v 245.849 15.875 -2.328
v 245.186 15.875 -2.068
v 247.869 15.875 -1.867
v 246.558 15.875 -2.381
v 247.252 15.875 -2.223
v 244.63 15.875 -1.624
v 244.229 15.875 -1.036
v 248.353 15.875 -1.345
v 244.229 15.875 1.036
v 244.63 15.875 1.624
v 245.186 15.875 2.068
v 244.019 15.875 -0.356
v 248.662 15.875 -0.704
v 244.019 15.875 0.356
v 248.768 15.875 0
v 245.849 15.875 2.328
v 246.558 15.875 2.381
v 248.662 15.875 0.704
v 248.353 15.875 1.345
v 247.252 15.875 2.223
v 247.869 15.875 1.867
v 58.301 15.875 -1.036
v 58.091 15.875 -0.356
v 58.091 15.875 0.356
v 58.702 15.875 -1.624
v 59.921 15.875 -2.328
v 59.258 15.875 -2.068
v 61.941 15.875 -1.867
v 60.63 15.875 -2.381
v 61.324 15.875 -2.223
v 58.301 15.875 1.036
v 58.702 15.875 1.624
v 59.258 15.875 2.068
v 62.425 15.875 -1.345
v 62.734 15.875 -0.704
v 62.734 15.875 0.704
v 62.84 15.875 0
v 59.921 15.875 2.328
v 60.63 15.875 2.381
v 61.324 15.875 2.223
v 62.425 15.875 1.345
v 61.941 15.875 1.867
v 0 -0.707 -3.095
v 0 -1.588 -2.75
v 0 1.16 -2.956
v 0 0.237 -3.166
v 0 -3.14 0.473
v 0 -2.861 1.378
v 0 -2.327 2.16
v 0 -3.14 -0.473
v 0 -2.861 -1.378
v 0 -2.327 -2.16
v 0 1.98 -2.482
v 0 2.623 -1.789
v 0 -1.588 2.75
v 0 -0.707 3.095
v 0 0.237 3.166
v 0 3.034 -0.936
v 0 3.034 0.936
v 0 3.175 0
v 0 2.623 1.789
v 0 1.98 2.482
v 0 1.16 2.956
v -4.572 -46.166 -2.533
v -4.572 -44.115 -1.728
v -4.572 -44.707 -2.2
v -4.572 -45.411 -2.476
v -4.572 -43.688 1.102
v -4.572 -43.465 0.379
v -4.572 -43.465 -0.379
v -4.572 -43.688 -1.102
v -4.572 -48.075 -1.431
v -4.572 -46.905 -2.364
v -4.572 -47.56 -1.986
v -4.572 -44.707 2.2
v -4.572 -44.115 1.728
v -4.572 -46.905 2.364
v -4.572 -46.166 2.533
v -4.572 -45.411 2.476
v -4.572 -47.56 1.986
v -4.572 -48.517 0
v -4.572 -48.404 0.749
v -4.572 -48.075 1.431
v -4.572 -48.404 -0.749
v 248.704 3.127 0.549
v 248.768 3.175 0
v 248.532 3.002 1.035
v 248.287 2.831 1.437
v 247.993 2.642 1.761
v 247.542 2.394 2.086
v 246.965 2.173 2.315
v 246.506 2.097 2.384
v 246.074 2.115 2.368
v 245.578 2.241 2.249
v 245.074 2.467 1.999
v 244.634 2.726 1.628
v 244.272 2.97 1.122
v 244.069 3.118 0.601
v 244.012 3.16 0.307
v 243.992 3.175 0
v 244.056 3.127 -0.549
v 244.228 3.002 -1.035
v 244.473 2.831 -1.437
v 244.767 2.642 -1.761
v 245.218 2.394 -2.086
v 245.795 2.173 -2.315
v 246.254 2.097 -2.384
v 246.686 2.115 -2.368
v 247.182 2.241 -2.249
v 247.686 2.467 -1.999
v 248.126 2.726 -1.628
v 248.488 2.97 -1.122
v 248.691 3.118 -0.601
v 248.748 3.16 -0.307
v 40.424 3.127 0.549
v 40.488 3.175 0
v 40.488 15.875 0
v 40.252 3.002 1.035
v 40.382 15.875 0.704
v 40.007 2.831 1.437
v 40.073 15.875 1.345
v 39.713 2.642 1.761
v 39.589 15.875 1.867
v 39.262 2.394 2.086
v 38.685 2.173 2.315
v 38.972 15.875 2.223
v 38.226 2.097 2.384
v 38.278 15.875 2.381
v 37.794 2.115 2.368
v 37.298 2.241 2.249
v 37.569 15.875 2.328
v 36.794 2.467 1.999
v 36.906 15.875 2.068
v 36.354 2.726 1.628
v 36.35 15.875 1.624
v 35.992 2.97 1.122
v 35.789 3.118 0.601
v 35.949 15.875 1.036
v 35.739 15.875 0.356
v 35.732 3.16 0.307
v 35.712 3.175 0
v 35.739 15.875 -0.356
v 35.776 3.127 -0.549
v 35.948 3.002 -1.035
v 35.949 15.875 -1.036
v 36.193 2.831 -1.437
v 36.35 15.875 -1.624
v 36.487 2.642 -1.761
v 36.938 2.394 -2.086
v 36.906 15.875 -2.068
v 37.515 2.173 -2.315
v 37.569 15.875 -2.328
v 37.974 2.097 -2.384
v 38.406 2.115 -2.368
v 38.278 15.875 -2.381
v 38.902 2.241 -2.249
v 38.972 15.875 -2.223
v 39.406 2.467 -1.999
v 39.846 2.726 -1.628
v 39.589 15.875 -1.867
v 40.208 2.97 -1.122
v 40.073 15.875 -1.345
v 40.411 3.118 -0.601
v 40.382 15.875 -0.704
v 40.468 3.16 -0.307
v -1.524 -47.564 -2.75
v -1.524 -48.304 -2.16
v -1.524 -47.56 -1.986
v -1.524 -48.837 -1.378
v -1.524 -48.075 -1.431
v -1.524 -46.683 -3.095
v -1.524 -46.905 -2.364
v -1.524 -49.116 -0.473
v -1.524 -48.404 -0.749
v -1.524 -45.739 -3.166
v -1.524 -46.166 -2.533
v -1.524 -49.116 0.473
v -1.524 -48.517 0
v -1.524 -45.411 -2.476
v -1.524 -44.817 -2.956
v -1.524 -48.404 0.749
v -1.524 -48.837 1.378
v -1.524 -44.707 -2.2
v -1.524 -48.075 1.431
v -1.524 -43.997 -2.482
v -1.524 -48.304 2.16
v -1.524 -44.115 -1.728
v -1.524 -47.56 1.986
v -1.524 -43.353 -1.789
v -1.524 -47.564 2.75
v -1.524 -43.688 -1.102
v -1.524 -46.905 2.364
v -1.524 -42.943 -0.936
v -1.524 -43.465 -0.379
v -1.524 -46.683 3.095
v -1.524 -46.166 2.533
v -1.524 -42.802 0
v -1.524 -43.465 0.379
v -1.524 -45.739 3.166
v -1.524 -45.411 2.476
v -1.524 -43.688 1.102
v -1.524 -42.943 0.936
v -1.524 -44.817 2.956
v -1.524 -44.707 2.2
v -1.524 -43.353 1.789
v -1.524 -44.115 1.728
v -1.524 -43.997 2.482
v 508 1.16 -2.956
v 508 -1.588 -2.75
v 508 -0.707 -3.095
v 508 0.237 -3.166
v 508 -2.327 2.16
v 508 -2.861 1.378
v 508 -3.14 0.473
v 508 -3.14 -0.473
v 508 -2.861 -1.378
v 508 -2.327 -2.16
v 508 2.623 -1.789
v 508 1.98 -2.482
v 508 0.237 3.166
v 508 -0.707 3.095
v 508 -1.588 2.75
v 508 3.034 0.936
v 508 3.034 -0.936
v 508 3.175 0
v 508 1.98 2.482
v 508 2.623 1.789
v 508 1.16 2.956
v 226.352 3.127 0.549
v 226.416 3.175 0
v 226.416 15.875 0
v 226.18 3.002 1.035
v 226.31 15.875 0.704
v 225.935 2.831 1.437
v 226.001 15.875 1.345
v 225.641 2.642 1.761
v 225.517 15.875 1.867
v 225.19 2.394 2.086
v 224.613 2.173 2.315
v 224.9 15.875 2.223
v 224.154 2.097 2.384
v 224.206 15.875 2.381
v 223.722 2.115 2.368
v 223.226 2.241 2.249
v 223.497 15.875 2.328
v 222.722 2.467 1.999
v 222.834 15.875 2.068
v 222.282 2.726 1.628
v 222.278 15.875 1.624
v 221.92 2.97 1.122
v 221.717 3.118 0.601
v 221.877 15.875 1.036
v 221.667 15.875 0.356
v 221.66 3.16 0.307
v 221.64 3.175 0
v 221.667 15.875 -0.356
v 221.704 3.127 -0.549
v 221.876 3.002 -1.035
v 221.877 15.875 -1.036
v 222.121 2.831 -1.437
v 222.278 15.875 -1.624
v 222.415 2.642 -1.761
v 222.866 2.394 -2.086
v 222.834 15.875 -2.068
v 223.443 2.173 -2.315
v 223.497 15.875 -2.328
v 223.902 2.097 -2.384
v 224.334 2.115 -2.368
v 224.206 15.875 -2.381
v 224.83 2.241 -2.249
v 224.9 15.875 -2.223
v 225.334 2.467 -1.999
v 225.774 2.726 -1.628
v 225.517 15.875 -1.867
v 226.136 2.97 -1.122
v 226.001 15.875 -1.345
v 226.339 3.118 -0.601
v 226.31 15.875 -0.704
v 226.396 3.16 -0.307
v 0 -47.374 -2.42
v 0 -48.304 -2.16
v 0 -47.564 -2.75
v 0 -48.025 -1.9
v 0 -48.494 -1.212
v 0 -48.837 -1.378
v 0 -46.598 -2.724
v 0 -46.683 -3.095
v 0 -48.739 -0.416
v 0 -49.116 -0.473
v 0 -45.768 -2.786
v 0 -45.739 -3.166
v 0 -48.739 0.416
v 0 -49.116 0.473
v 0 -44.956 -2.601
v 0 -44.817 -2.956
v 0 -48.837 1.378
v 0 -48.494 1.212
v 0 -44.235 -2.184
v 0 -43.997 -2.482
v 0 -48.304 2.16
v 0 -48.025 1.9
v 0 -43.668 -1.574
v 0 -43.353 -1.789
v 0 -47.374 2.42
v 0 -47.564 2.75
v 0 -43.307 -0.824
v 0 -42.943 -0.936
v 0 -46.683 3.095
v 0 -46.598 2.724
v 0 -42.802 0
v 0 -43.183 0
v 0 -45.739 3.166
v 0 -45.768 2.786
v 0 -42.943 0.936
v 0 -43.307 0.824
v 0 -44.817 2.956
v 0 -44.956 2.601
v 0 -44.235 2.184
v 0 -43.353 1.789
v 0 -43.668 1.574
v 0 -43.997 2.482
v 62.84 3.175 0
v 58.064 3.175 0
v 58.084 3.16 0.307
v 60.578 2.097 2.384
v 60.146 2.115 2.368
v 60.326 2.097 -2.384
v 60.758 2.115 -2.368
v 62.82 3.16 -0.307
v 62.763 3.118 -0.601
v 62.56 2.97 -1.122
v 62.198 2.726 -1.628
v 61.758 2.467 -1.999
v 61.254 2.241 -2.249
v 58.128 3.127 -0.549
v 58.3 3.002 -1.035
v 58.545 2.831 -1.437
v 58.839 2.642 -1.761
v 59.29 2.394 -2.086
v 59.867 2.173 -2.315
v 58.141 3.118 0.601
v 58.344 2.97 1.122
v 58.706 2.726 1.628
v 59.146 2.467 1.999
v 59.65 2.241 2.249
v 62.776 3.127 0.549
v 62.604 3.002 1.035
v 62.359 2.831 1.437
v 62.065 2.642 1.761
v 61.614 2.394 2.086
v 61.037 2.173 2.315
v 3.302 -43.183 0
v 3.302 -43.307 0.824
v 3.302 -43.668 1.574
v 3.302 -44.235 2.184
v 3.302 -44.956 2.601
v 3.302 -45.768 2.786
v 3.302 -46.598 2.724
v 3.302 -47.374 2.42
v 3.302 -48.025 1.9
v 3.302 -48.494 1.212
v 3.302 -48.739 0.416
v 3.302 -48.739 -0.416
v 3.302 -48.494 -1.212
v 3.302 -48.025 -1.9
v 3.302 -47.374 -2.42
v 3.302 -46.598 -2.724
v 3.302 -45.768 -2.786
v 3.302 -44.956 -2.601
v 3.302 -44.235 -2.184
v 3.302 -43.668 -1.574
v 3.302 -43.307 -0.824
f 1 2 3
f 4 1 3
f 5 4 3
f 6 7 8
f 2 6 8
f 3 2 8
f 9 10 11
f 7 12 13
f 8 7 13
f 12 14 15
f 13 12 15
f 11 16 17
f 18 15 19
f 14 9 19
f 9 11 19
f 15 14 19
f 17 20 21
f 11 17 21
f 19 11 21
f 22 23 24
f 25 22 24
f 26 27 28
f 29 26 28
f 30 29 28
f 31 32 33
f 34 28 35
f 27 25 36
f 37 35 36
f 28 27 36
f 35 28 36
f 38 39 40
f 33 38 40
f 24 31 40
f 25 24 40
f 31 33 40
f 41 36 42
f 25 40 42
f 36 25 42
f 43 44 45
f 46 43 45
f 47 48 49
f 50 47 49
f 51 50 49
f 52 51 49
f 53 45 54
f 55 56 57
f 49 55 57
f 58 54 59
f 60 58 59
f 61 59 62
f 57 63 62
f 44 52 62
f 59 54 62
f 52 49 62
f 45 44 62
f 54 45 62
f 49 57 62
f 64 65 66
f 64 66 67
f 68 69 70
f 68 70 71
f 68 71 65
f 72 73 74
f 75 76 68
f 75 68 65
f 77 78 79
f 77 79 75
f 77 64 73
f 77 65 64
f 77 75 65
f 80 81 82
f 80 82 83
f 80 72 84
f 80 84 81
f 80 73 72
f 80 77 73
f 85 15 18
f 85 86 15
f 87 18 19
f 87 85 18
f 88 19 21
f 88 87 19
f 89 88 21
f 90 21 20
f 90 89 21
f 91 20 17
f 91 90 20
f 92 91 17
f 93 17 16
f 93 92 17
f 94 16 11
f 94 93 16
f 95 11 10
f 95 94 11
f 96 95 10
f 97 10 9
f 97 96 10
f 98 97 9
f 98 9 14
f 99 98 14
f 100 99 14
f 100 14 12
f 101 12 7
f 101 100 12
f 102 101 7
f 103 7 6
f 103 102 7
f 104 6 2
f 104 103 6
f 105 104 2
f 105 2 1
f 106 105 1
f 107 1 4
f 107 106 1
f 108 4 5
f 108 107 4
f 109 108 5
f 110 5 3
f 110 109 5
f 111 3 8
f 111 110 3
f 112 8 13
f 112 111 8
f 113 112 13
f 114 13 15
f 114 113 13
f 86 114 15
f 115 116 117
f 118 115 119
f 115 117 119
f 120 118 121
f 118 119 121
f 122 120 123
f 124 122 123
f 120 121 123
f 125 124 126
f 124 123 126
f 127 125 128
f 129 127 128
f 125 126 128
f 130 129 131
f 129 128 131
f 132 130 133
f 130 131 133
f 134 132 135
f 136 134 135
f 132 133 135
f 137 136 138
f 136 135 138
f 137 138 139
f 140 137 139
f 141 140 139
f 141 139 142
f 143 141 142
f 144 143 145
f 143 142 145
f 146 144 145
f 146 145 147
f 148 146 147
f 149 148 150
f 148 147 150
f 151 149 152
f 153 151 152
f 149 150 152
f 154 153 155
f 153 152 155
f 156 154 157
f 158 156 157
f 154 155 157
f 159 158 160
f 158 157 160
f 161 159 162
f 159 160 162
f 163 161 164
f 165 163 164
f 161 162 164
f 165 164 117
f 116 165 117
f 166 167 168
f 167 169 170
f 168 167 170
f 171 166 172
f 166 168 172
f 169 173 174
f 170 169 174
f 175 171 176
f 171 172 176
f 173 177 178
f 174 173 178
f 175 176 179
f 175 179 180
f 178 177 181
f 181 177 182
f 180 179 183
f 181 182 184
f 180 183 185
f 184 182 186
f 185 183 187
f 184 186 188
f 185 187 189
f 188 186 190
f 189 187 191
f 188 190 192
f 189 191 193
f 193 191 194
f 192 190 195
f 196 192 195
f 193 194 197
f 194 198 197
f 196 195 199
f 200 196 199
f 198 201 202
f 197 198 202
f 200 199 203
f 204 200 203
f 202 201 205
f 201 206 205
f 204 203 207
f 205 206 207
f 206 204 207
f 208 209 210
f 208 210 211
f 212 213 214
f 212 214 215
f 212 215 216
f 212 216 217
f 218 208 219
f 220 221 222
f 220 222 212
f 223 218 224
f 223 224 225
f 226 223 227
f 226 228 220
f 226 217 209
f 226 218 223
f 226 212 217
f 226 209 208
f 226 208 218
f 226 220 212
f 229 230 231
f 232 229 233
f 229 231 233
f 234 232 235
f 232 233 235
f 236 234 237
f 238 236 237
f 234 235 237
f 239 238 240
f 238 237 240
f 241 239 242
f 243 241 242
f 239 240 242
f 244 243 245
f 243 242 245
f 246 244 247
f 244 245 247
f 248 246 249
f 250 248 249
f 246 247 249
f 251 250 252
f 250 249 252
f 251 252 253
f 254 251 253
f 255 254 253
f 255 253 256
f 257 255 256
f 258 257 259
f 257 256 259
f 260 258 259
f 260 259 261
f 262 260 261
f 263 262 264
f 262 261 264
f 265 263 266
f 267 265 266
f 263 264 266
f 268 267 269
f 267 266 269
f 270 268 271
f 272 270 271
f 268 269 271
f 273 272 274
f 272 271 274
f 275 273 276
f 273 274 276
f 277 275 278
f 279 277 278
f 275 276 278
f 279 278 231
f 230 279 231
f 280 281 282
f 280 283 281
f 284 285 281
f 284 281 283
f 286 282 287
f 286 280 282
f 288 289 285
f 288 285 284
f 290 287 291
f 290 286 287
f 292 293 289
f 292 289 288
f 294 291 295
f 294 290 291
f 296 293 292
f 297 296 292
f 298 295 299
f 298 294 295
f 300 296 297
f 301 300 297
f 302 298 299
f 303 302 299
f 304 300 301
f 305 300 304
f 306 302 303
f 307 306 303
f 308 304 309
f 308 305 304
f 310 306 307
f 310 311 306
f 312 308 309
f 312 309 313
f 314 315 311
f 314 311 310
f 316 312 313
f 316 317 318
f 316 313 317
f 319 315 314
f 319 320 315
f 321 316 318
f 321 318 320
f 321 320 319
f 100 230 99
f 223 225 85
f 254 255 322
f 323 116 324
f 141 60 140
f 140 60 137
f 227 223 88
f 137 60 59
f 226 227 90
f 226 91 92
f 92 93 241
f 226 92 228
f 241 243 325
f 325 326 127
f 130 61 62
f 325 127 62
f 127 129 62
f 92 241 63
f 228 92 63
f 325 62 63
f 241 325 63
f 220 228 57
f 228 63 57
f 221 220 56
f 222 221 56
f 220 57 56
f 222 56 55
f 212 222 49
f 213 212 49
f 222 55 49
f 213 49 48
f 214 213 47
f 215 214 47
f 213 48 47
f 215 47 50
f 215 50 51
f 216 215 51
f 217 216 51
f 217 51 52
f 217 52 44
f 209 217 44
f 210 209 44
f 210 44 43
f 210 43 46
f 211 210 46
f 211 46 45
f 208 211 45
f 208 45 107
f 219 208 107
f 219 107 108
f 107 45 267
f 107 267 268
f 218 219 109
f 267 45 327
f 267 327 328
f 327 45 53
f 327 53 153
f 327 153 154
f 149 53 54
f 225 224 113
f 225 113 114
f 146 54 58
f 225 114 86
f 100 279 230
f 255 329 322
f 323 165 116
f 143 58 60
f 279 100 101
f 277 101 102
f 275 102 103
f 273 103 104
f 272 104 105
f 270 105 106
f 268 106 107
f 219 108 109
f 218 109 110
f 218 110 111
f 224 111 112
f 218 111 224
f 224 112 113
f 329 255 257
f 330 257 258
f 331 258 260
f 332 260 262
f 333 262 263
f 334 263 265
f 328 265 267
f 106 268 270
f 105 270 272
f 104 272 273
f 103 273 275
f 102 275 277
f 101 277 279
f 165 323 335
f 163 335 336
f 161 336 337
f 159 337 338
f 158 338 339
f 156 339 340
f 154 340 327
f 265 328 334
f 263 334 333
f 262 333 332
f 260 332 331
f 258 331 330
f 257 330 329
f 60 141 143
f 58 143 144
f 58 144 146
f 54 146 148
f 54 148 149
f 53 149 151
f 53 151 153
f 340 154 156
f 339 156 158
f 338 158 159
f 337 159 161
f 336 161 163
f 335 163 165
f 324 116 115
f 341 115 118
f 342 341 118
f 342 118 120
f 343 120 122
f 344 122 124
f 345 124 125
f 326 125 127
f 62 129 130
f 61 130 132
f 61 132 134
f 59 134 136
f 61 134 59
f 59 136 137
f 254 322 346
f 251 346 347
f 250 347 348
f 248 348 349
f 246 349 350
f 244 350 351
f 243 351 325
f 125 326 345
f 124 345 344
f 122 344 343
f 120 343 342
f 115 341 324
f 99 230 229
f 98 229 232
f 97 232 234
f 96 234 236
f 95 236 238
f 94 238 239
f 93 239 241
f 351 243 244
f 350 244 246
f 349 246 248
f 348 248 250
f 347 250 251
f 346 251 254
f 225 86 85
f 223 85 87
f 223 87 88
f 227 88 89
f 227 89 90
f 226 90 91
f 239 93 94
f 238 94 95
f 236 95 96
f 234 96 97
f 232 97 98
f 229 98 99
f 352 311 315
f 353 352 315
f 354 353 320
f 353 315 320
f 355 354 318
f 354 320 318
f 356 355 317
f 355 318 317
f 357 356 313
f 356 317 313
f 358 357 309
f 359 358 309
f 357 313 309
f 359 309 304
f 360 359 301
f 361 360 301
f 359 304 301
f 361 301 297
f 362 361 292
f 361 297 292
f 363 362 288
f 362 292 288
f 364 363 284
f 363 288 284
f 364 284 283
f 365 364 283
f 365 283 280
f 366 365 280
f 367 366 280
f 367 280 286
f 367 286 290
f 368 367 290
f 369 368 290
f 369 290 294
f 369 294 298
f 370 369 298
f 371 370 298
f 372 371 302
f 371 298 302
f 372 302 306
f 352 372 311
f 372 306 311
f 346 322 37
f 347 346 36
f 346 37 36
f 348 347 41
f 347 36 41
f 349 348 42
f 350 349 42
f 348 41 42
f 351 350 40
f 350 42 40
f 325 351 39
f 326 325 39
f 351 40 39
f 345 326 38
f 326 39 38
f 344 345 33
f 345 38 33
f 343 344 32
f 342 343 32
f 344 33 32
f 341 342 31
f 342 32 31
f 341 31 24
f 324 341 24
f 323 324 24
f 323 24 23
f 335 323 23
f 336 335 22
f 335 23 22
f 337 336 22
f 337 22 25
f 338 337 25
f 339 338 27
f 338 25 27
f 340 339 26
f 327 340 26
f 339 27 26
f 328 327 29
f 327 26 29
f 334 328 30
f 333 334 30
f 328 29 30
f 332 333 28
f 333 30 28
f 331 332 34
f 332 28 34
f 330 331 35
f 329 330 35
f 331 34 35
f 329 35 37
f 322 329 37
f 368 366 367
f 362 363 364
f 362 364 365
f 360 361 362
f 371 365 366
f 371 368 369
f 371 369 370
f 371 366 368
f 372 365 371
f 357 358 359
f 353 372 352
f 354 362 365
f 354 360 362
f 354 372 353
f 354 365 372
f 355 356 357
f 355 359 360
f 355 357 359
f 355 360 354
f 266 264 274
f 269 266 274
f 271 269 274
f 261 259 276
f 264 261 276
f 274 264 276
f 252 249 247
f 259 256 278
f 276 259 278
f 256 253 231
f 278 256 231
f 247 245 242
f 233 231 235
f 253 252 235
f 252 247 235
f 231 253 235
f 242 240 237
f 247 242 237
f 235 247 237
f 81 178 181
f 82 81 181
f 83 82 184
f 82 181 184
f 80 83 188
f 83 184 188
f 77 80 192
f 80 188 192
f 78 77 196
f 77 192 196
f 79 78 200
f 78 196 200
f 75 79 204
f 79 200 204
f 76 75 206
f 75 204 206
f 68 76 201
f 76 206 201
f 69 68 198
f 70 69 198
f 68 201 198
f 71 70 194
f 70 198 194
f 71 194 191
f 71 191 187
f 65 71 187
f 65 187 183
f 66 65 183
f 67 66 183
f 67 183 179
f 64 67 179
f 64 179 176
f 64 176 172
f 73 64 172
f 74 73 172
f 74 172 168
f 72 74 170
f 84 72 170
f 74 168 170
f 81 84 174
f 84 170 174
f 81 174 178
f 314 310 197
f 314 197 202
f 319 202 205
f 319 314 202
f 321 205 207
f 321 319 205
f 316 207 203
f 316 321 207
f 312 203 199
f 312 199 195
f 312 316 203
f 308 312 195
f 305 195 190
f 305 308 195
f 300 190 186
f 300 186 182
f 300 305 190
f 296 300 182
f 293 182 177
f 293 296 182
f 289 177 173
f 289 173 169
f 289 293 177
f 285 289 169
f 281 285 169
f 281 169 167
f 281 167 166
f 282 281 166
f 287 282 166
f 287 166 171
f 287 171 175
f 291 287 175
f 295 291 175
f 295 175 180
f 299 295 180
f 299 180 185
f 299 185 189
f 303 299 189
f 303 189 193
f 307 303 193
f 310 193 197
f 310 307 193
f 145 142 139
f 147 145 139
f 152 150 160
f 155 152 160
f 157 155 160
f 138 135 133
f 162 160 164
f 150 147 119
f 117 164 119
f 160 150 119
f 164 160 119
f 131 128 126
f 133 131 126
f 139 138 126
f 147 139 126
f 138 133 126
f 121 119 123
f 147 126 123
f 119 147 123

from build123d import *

# Parameters (mm, degrees)
F0_R          = 3.175
F1_DEPTH      = 508
F3_R          = 2.3876
F4_DEPTH      = 2.54
F4_DEPTH_BACK = 12.7
F5_R          = 3.175
F6_DEPTH      = 1.524
F7_R          = 2.794
F8_DEPTH      = 3.302
F9_R          = 2.54
F10_DEPTH     = 3.048


with BuildPart() as f1:
    # F0 (on Right) → F1 (new body)
    with BuildSketch(Plane.YZ):
        Circle(F0_R)
    extrude(amount=F1_DEPTH)

    # F3 (on offset) → F4 (join, two sides)
    with BuildSketch(Plane.XZ.offset(-3.175)) as f4_sk:
        with Locations((246.38, 0)):
            Circle(F3_R)
        with Locations((224.028, 0)):
            Circle(F3_R)
        with Locations((60.452, 0)):
            Circle(F3_R)
        with Locations((38.1, 0)):
            Circle(F3_R)
    extrude(amount=F4_DEPTH)
    extrude(f4_sk.sketch, amount=-F4_DEPTH_BACK)


with BuildPart() as f6:
    # F5 (on Right) → F6 (new body)
    with BuildSketch(Plane.YZ):
        with Locations((-45.976562, 0)):
            Circle(F5_R)
    extrude(amount=-F6_DEPTH)

    # F7 (on face) → F8 (join)
    with BuildSketch(Plane.YZ):
        with Locations((-45.976562, 0)):
            Circle(F7_R)
    extrude(amount=F8_DEPTH)

    # F9 (on face) → F10 (join)
    with BuildSketch(Plane(origin=(-1.524, 0, 0), x_dir=(0, -1, 0), z_dir=(-1, 0, 0))):
        with Locations((45.976562, 0)):
            Circle(F9_R)
    extrude(amount=F10_DEPTH)


solid = Compound([f1.part, f6.part])
